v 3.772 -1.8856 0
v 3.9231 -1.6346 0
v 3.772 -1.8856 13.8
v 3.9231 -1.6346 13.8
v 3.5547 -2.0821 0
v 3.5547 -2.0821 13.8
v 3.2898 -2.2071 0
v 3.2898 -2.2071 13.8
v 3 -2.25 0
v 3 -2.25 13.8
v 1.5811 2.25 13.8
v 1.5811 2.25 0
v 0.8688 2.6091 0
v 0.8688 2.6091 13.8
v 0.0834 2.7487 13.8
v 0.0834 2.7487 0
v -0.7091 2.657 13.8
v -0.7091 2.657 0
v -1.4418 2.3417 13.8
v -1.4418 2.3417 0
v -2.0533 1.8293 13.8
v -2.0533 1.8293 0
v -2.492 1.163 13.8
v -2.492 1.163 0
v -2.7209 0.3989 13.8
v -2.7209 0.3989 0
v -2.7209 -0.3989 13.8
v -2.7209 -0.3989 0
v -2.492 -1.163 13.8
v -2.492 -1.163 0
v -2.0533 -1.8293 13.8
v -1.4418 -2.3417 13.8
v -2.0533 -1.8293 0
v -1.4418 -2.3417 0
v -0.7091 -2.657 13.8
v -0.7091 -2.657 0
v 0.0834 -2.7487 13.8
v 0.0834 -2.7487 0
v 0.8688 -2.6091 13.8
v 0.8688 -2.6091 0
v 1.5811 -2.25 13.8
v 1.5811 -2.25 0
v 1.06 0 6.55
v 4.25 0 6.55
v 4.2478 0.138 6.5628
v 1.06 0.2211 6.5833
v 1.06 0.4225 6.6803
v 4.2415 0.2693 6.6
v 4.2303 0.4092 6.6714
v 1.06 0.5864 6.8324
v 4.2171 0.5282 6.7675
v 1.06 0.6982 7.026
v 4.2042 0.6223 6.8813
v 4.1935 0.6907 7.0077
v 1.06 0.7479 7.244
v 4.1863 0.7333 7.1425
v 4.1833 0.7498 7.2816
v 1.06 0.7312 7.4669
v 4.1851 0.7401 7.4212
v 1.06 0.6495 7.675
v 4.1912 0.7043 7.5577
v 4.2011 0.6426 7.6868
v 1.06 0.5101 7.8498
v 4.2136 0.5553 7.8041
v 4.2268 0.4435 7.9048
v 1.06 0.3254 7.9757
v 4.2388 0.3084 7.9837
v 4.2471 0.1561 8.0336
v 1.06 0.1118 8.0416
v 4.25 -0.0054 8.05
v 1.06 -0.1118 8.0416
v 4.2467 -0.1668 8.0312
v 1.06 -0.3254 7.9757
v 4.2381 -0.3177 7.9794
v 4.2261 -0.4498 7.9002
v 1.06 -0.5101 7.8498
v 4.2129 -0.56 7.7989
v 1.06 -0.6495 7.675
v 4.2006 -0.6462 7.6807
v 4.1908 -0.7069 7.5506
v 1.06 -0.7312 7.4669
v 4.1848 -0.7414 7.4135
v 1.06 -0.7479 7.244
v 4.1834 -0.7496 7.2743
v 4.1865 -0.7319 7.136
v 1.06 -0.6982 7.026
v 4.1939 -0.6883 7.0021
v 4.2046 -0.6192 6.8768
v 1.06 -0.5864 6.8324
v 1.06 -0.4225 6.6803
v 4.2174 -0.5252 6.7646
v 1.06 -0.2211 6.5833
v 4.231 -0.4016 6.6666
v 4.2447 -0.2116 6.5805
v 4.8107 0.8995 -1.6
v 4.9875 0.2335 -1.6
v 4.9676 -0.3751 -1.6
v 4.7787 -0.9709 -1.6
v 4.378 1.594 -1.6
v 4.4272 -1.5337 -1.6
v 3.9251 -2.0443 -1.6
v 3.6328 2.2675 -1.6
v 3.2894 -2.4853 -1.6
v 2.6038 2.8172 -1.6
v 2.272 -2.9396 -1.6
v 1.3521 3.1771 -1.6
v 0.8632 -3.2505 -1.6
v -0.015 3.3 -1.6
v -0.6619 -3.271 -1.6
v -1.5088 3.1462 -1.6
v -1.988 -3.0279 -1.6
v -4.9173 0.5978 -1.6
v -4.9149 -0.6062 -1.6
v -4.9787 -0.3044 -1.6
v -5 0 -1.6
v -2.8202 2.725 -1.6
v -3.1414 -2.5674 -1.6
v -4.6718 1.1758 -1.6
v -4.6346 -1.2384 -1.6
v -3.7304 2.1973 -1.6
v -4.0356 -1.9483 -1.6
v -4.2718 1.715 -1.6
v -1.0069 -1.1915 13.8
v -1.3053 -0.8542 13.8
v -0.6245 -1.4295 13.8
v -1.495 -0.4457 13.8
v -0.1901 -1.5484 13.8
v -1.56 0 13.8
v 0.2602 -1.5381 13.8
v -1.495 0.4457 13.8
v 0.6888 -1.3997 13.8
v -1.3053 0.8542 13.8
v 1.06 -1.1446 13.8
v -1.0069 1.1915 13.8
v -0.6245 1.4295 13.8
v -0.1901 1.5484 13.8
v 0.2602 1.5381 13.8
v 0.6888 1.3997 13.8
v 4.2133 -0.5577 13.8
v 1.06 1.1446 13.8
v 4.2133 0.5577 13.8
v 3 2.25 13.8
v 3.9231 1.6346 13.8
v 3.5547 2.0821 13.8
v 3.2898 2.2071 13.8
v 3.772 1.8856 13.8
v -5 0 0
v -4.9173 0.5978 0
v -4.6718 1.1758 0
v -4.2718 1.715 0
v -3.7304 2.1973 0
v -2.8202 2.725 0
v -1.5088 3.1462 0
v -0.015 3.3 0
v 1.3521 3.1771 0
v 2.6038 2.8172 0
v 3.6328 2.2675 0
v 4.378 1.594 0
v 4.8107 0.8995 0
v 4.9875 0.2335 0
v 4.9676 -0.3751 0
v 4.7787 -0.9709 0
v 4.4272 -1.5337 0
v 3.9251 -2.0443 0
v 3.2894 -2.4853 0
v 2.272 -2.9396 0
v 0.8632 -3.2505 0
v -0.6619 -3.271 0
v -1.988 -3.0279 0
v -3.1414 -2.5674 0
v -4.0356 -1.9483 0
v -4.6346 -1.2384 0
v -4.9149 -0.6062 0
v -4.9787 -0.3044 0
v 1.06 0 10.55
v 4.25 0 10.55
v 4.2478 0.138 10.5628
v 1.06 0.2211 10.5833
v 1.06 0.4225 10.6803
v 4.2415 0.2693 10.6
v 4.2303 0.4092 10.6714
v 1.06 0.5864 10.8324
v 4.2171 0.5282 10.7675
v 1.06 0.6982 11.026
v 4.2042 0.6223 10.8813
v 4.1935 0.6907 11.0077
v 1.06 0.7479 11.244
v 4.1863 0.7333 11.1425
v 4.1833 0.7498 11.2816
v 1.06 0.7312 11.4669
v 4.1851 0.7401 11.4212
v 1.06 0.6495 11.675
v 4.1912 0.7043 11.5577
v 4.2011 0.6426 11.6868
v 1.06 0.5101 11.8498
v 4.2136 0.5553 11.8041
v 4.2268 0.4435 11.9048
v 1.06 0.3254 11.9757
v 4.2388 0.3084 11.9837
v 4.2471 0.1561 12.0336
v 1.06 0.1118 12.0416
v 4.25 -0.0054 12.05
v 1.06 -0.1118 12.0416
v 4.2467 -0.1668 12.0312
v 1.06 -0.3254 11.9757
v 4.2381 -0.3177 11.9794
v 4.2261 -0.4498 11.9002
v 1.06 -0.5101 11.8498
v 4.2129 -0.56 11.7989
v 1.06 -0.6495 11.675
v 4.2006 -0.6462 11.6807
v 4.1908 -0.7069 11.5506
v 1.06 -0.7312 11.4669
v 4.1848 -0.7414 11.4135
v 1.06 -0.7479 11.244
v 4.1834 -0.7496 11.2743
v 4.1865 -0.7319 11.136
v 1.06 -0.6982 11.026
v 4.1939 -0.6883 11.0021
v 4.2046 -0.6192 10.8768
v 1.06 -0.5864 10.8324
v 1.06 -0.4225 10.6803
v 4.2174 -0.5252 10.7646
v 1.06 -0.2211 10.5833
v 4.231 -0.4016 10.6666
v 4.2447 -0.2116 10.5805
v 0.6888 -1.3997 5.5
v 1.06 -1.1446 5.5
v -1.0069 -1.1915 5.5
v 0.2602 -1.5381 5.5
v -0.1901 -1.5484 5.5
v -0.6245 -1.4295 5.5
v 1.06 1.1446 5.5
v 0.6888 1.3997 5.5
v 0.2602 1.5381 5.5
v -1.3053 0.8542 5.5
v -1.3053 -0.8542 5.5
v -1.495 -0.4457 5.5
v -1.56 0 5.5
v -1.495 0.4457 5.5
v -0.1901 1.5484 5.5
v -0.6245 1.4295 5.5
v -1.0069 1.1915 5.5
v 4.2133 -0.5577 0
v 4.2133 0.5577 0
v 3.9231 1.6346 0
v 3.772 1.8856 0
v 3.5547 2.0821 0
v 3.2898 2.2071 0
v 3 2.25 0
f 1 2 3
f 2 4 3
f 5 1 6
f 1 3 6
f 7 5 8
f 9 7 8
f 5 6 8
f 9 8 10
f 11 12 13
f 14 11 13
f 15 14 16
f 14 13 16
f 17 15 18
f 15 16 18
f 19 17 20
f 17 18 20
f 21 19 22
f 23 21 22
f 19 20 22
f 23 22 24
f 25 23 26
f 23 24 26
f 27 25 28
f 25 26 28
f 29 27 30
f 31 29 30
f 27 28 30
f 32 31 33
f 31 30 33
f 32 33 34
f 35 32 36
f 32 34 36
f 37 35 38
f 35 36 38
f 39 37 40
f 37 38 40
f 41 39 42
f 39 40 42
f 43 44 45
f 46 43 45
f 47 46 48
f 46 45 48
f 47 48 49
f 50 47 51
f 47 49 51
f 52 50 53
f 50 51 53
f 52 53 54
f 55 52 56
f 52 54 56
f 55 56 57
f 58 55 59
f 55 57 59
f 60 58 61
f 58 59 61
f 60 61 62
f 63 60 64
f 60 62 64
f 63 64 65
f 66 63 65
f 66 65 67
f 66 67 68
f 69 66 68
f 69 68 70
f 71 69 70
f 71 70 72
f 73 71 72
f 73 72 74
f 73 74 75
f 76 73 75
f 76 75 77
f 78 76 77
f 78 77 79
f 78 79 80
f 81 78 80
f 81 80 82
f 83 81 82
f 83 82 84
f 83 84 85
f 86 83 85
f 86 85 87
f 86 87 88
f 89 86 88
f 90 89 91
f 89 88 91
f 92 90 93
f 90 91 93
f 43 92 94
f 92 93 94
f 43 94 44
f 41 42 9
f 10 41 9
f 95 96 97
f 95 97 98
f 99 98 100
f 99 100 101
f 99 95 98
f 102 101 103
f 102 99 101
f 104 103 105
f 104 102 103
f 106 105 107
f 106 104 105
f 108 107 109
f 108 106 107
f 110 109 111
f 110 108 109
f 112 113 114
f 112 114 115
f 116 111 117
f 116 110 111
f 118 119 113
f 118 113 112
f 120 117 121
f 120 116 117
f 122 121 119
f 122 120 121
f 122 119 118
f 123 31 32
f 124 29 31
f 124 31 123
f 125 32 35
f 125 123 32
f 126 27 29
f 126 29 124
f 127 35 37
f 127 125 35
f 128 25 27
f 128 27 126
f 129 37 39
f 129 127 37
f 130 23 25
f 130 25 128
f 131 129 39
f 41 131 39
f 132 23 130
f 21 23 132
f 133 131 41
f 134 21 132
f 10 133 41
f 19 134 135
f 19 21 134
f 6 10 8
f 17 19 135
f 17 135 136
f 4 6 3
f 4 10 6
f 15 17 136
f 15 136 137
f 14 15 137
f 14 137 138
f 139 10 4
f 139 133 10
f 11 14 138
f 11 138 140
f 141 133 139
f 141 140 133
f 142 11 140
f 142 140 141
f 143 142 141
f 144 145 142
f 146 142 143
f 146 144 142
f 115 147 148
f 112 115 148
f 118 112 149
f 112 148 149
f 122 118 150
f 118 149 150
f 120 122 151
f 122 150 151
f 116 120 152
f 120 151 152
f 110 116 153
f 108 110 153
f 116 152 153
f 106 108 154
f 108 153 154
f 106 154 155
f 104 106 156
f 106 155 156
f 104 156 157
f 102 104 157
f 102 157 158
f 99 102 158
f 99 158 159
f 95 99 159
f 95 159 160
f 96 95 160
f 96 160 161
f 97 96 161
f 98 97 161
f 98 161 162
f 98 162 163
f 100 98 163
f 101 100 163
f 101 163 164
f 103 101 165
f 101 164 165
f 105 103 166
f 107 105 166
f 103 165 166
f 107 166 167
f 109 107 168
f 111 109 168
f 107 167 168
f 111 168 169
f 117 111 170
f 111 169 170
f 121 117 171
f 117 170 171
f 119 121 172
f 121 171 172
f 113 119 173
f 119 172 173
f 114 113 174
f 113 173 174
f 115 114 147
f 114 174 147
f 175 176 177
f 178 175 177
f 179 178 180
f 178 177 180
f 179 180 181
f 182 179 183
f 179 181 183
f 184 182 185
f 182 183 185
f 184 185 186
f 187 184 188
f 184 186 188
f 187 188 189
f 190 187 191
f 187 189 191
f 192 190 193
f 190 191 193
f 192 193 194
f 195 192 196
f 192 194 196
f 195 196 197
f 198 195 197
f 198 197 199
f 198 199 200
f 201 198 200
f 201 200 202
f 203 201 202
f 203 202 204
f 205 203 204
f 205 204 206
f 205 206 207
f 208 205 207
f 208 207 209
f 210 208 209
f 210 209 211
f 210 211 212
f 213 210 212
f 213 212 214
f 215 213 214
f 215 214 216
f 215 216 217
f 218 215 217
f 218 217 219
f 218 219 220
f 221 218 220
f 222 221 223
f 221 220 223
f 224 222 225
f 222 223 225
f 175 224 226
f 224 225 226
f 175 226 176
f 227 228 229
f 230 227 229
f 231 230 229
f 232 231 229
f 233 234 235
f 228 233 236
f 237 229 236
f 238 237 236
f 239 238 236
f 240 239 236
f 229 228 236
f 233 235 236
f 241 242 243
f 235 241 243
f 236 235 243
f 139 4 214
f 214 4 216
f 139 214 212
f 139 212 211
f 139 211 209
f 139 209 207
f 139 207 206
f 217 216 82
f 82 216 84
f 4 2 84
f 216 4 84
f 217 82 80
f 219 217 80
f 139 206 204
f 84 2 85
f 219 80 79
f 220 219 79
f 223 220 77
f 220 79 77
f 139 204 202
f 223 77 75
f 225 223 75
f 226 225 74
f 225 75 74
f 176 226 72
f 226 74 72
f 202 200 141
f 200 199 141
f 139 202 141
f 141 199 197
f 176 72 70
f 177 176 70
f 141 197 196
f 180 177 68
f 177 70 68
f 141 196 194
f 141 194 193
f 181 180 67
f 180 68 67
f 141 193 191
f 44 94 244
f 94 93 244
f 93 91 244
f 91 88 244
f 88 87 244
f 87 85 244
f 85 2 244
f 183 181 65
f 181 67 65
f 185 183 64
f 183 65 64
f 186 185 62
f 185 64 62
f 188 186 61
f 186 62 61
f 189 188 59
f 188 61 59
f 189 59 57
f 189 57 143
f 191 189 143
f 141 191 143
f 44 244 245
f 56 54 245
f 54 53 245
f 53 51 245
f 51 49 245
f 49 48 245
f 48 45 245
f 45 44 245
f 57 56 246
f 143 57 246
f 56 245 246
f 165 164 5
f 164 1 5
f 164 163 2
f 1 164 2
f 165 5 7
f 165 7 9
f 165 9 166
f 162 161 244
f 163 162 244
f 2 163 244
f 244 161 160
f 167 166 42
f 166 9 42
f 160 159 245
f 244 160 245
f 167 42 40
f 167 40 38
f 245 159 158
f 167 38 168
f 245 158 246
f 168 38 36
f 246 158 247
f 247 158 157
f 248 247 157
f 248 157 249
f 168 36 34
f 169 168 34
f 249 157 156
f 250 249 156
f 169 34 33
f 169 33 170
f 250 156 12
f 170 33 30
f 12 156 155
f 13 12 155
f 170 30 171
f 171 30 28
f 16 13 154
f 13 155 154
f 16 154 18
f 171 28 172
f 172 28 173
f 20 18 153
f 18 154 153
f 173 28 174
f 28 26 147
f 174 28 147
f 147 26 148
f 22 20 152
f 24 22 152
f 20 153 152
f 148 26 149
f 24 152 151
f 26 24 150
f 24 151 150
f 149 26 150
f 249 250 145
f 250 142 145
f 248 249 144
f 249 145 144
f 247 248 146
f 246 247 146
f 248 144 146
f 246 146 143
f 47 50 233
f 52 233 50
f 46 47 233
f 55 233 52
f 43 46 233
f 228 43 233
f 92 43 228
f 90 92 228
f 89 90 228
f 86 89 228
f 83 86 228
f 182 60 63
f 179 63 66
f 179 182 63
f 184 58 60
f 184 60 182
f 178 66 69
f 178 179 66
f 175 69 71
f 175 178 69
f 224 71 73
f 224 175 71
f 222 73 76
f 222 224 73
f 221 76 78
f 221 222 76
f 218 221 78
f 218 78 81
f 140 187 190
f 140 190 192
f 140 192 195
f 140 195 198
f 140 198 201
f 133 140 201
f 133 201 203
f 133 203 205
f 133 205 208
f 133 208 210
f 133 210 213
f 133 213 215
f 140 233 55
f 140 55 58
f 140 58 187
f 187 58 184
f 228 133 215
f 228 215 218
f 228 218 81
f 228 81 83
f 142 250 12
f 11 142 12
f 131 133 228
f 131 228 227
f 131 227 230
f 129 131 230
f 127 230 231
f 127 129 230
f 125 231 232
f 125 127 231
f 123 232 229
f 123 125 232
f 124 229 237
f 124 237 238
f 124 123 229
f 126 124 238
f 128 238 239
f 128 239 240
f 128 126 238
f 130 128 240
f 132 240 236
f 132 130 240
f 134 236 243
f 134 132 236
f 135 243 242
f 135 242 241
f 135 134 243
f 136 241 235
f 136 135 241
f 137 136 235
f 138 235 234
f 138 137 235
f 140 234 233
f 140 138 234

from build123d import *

# Parameters (mm, degrees)
BOSS_EXTRUDE1_DEPTH = 13.8
CUT_EXTRUDE1_DEPTH  = 8.3
SKETCH5_R           = 0.75
CUT_EXTRUDE3_DEPTH  = 4.5
SKETCH7_RX          = 5
SKETCH7_RY          = 3.3
BOSS_EXTRUDE5_DEPTH = 1.6
FILLET1_R           = 1
CUT_EXTRUDE4_DEPTH  = 8.3


with BuildPart() as part:
    # Sketch1 → Boss-Extrude1 (new body)
    with BuildSketch(Plane.XY):
        with BuildLine():
            Line((1.58113883, -2.25), (3.605551275, -2.25))
            ThreePointArc((3.605551275, -2.25), (4.25, 0), (3.605551275, 2.25))
            Line((3.605551275, 2.25), (1.58113883, 2.25))
            ThreePointArc((1.58113883, 2.25), (-2.75, 0), (1.58113883, -2.25))
        make_face()
    extrude(amount=BOSS_EXTRUDE1_DEPTH)

    # Sketch3 → Cut-Extrude1 (cut)
    with BuildSketch(Plane.XY.offset(13.8)):
        with BuildLine():
            Line((1, -1.118033989), (1, 1.118033989))
            ThreePointArc((1, 1.118033989), (-1.5, 0), (1, -1.118033989))
        make_face()
    extrude(amount=-CUT_EXTRUDE1_DEPTH, mode=Mode.SUBTRACT)

    # Sketch5 → Cut-Extrude3 (cut)
    with BuildSketch(Plane(origin=(4.25, 0, 0), x_dir=(0, 0, -1), z_dir=(1, 0, 0))):
        with Locations((-11.3, 0)):
            Circle(SKETCH5_R)
        with Locations((-7.3, 0)):
            Circle(SKETCH5_R)
    extrude(amount=-CUT_EXTRUDE3_DEPTH, mode=Mode.SUBTRACT)

    # Sketch7 → Boss-Extrude5 (add)
    with BuildSketch(Plane(origin=(0, 0, 0), x_dir=(-1, 0, 0), z_dir=(0, 0, -1))):
        with Locations(Location((0, 0), (0, 0, 0))):
            Ellipse(SKETCH7_RX, SKETCH7_RY)
    extrude(amount=BOSS_EXTRUDE5_DEPTH)

    # Fillet1
    fillet1_edges = [part.edges().sort_by_distance(p)[0] for p in [
        (3.605551275, -2.25, 6.9),
        (3.605551275, 2.25, 6.9),
    ]]
    fillet(fillet1_edges, radius=FILLET1_R)

    # Sketch8 → Cut-Extrude4 (cut)
    with BuildSketch(Plane.XY.offset(13.8)):
        with BuildLine():
            Line((1.06, 1.144552314), (1.06, -1.144552314))
            ThreePointArc((1.06, -1.144552314), (-1.56, 0), (1.06, 1.144552314))
        make_face()
        with BuildLine():
            Line((1, 1.118033989), (1, -1.118033989))
            ThreePointArc((1, -1.118033989), (-1.5, 0), (1, 1.118033989))
        make_face(mode=Mode.SUBTRACT)
    extrude(amount=-CUT_EXTRUDE4_DEPTH, mode=Mode.SUBTRACT)


solid = part.part
